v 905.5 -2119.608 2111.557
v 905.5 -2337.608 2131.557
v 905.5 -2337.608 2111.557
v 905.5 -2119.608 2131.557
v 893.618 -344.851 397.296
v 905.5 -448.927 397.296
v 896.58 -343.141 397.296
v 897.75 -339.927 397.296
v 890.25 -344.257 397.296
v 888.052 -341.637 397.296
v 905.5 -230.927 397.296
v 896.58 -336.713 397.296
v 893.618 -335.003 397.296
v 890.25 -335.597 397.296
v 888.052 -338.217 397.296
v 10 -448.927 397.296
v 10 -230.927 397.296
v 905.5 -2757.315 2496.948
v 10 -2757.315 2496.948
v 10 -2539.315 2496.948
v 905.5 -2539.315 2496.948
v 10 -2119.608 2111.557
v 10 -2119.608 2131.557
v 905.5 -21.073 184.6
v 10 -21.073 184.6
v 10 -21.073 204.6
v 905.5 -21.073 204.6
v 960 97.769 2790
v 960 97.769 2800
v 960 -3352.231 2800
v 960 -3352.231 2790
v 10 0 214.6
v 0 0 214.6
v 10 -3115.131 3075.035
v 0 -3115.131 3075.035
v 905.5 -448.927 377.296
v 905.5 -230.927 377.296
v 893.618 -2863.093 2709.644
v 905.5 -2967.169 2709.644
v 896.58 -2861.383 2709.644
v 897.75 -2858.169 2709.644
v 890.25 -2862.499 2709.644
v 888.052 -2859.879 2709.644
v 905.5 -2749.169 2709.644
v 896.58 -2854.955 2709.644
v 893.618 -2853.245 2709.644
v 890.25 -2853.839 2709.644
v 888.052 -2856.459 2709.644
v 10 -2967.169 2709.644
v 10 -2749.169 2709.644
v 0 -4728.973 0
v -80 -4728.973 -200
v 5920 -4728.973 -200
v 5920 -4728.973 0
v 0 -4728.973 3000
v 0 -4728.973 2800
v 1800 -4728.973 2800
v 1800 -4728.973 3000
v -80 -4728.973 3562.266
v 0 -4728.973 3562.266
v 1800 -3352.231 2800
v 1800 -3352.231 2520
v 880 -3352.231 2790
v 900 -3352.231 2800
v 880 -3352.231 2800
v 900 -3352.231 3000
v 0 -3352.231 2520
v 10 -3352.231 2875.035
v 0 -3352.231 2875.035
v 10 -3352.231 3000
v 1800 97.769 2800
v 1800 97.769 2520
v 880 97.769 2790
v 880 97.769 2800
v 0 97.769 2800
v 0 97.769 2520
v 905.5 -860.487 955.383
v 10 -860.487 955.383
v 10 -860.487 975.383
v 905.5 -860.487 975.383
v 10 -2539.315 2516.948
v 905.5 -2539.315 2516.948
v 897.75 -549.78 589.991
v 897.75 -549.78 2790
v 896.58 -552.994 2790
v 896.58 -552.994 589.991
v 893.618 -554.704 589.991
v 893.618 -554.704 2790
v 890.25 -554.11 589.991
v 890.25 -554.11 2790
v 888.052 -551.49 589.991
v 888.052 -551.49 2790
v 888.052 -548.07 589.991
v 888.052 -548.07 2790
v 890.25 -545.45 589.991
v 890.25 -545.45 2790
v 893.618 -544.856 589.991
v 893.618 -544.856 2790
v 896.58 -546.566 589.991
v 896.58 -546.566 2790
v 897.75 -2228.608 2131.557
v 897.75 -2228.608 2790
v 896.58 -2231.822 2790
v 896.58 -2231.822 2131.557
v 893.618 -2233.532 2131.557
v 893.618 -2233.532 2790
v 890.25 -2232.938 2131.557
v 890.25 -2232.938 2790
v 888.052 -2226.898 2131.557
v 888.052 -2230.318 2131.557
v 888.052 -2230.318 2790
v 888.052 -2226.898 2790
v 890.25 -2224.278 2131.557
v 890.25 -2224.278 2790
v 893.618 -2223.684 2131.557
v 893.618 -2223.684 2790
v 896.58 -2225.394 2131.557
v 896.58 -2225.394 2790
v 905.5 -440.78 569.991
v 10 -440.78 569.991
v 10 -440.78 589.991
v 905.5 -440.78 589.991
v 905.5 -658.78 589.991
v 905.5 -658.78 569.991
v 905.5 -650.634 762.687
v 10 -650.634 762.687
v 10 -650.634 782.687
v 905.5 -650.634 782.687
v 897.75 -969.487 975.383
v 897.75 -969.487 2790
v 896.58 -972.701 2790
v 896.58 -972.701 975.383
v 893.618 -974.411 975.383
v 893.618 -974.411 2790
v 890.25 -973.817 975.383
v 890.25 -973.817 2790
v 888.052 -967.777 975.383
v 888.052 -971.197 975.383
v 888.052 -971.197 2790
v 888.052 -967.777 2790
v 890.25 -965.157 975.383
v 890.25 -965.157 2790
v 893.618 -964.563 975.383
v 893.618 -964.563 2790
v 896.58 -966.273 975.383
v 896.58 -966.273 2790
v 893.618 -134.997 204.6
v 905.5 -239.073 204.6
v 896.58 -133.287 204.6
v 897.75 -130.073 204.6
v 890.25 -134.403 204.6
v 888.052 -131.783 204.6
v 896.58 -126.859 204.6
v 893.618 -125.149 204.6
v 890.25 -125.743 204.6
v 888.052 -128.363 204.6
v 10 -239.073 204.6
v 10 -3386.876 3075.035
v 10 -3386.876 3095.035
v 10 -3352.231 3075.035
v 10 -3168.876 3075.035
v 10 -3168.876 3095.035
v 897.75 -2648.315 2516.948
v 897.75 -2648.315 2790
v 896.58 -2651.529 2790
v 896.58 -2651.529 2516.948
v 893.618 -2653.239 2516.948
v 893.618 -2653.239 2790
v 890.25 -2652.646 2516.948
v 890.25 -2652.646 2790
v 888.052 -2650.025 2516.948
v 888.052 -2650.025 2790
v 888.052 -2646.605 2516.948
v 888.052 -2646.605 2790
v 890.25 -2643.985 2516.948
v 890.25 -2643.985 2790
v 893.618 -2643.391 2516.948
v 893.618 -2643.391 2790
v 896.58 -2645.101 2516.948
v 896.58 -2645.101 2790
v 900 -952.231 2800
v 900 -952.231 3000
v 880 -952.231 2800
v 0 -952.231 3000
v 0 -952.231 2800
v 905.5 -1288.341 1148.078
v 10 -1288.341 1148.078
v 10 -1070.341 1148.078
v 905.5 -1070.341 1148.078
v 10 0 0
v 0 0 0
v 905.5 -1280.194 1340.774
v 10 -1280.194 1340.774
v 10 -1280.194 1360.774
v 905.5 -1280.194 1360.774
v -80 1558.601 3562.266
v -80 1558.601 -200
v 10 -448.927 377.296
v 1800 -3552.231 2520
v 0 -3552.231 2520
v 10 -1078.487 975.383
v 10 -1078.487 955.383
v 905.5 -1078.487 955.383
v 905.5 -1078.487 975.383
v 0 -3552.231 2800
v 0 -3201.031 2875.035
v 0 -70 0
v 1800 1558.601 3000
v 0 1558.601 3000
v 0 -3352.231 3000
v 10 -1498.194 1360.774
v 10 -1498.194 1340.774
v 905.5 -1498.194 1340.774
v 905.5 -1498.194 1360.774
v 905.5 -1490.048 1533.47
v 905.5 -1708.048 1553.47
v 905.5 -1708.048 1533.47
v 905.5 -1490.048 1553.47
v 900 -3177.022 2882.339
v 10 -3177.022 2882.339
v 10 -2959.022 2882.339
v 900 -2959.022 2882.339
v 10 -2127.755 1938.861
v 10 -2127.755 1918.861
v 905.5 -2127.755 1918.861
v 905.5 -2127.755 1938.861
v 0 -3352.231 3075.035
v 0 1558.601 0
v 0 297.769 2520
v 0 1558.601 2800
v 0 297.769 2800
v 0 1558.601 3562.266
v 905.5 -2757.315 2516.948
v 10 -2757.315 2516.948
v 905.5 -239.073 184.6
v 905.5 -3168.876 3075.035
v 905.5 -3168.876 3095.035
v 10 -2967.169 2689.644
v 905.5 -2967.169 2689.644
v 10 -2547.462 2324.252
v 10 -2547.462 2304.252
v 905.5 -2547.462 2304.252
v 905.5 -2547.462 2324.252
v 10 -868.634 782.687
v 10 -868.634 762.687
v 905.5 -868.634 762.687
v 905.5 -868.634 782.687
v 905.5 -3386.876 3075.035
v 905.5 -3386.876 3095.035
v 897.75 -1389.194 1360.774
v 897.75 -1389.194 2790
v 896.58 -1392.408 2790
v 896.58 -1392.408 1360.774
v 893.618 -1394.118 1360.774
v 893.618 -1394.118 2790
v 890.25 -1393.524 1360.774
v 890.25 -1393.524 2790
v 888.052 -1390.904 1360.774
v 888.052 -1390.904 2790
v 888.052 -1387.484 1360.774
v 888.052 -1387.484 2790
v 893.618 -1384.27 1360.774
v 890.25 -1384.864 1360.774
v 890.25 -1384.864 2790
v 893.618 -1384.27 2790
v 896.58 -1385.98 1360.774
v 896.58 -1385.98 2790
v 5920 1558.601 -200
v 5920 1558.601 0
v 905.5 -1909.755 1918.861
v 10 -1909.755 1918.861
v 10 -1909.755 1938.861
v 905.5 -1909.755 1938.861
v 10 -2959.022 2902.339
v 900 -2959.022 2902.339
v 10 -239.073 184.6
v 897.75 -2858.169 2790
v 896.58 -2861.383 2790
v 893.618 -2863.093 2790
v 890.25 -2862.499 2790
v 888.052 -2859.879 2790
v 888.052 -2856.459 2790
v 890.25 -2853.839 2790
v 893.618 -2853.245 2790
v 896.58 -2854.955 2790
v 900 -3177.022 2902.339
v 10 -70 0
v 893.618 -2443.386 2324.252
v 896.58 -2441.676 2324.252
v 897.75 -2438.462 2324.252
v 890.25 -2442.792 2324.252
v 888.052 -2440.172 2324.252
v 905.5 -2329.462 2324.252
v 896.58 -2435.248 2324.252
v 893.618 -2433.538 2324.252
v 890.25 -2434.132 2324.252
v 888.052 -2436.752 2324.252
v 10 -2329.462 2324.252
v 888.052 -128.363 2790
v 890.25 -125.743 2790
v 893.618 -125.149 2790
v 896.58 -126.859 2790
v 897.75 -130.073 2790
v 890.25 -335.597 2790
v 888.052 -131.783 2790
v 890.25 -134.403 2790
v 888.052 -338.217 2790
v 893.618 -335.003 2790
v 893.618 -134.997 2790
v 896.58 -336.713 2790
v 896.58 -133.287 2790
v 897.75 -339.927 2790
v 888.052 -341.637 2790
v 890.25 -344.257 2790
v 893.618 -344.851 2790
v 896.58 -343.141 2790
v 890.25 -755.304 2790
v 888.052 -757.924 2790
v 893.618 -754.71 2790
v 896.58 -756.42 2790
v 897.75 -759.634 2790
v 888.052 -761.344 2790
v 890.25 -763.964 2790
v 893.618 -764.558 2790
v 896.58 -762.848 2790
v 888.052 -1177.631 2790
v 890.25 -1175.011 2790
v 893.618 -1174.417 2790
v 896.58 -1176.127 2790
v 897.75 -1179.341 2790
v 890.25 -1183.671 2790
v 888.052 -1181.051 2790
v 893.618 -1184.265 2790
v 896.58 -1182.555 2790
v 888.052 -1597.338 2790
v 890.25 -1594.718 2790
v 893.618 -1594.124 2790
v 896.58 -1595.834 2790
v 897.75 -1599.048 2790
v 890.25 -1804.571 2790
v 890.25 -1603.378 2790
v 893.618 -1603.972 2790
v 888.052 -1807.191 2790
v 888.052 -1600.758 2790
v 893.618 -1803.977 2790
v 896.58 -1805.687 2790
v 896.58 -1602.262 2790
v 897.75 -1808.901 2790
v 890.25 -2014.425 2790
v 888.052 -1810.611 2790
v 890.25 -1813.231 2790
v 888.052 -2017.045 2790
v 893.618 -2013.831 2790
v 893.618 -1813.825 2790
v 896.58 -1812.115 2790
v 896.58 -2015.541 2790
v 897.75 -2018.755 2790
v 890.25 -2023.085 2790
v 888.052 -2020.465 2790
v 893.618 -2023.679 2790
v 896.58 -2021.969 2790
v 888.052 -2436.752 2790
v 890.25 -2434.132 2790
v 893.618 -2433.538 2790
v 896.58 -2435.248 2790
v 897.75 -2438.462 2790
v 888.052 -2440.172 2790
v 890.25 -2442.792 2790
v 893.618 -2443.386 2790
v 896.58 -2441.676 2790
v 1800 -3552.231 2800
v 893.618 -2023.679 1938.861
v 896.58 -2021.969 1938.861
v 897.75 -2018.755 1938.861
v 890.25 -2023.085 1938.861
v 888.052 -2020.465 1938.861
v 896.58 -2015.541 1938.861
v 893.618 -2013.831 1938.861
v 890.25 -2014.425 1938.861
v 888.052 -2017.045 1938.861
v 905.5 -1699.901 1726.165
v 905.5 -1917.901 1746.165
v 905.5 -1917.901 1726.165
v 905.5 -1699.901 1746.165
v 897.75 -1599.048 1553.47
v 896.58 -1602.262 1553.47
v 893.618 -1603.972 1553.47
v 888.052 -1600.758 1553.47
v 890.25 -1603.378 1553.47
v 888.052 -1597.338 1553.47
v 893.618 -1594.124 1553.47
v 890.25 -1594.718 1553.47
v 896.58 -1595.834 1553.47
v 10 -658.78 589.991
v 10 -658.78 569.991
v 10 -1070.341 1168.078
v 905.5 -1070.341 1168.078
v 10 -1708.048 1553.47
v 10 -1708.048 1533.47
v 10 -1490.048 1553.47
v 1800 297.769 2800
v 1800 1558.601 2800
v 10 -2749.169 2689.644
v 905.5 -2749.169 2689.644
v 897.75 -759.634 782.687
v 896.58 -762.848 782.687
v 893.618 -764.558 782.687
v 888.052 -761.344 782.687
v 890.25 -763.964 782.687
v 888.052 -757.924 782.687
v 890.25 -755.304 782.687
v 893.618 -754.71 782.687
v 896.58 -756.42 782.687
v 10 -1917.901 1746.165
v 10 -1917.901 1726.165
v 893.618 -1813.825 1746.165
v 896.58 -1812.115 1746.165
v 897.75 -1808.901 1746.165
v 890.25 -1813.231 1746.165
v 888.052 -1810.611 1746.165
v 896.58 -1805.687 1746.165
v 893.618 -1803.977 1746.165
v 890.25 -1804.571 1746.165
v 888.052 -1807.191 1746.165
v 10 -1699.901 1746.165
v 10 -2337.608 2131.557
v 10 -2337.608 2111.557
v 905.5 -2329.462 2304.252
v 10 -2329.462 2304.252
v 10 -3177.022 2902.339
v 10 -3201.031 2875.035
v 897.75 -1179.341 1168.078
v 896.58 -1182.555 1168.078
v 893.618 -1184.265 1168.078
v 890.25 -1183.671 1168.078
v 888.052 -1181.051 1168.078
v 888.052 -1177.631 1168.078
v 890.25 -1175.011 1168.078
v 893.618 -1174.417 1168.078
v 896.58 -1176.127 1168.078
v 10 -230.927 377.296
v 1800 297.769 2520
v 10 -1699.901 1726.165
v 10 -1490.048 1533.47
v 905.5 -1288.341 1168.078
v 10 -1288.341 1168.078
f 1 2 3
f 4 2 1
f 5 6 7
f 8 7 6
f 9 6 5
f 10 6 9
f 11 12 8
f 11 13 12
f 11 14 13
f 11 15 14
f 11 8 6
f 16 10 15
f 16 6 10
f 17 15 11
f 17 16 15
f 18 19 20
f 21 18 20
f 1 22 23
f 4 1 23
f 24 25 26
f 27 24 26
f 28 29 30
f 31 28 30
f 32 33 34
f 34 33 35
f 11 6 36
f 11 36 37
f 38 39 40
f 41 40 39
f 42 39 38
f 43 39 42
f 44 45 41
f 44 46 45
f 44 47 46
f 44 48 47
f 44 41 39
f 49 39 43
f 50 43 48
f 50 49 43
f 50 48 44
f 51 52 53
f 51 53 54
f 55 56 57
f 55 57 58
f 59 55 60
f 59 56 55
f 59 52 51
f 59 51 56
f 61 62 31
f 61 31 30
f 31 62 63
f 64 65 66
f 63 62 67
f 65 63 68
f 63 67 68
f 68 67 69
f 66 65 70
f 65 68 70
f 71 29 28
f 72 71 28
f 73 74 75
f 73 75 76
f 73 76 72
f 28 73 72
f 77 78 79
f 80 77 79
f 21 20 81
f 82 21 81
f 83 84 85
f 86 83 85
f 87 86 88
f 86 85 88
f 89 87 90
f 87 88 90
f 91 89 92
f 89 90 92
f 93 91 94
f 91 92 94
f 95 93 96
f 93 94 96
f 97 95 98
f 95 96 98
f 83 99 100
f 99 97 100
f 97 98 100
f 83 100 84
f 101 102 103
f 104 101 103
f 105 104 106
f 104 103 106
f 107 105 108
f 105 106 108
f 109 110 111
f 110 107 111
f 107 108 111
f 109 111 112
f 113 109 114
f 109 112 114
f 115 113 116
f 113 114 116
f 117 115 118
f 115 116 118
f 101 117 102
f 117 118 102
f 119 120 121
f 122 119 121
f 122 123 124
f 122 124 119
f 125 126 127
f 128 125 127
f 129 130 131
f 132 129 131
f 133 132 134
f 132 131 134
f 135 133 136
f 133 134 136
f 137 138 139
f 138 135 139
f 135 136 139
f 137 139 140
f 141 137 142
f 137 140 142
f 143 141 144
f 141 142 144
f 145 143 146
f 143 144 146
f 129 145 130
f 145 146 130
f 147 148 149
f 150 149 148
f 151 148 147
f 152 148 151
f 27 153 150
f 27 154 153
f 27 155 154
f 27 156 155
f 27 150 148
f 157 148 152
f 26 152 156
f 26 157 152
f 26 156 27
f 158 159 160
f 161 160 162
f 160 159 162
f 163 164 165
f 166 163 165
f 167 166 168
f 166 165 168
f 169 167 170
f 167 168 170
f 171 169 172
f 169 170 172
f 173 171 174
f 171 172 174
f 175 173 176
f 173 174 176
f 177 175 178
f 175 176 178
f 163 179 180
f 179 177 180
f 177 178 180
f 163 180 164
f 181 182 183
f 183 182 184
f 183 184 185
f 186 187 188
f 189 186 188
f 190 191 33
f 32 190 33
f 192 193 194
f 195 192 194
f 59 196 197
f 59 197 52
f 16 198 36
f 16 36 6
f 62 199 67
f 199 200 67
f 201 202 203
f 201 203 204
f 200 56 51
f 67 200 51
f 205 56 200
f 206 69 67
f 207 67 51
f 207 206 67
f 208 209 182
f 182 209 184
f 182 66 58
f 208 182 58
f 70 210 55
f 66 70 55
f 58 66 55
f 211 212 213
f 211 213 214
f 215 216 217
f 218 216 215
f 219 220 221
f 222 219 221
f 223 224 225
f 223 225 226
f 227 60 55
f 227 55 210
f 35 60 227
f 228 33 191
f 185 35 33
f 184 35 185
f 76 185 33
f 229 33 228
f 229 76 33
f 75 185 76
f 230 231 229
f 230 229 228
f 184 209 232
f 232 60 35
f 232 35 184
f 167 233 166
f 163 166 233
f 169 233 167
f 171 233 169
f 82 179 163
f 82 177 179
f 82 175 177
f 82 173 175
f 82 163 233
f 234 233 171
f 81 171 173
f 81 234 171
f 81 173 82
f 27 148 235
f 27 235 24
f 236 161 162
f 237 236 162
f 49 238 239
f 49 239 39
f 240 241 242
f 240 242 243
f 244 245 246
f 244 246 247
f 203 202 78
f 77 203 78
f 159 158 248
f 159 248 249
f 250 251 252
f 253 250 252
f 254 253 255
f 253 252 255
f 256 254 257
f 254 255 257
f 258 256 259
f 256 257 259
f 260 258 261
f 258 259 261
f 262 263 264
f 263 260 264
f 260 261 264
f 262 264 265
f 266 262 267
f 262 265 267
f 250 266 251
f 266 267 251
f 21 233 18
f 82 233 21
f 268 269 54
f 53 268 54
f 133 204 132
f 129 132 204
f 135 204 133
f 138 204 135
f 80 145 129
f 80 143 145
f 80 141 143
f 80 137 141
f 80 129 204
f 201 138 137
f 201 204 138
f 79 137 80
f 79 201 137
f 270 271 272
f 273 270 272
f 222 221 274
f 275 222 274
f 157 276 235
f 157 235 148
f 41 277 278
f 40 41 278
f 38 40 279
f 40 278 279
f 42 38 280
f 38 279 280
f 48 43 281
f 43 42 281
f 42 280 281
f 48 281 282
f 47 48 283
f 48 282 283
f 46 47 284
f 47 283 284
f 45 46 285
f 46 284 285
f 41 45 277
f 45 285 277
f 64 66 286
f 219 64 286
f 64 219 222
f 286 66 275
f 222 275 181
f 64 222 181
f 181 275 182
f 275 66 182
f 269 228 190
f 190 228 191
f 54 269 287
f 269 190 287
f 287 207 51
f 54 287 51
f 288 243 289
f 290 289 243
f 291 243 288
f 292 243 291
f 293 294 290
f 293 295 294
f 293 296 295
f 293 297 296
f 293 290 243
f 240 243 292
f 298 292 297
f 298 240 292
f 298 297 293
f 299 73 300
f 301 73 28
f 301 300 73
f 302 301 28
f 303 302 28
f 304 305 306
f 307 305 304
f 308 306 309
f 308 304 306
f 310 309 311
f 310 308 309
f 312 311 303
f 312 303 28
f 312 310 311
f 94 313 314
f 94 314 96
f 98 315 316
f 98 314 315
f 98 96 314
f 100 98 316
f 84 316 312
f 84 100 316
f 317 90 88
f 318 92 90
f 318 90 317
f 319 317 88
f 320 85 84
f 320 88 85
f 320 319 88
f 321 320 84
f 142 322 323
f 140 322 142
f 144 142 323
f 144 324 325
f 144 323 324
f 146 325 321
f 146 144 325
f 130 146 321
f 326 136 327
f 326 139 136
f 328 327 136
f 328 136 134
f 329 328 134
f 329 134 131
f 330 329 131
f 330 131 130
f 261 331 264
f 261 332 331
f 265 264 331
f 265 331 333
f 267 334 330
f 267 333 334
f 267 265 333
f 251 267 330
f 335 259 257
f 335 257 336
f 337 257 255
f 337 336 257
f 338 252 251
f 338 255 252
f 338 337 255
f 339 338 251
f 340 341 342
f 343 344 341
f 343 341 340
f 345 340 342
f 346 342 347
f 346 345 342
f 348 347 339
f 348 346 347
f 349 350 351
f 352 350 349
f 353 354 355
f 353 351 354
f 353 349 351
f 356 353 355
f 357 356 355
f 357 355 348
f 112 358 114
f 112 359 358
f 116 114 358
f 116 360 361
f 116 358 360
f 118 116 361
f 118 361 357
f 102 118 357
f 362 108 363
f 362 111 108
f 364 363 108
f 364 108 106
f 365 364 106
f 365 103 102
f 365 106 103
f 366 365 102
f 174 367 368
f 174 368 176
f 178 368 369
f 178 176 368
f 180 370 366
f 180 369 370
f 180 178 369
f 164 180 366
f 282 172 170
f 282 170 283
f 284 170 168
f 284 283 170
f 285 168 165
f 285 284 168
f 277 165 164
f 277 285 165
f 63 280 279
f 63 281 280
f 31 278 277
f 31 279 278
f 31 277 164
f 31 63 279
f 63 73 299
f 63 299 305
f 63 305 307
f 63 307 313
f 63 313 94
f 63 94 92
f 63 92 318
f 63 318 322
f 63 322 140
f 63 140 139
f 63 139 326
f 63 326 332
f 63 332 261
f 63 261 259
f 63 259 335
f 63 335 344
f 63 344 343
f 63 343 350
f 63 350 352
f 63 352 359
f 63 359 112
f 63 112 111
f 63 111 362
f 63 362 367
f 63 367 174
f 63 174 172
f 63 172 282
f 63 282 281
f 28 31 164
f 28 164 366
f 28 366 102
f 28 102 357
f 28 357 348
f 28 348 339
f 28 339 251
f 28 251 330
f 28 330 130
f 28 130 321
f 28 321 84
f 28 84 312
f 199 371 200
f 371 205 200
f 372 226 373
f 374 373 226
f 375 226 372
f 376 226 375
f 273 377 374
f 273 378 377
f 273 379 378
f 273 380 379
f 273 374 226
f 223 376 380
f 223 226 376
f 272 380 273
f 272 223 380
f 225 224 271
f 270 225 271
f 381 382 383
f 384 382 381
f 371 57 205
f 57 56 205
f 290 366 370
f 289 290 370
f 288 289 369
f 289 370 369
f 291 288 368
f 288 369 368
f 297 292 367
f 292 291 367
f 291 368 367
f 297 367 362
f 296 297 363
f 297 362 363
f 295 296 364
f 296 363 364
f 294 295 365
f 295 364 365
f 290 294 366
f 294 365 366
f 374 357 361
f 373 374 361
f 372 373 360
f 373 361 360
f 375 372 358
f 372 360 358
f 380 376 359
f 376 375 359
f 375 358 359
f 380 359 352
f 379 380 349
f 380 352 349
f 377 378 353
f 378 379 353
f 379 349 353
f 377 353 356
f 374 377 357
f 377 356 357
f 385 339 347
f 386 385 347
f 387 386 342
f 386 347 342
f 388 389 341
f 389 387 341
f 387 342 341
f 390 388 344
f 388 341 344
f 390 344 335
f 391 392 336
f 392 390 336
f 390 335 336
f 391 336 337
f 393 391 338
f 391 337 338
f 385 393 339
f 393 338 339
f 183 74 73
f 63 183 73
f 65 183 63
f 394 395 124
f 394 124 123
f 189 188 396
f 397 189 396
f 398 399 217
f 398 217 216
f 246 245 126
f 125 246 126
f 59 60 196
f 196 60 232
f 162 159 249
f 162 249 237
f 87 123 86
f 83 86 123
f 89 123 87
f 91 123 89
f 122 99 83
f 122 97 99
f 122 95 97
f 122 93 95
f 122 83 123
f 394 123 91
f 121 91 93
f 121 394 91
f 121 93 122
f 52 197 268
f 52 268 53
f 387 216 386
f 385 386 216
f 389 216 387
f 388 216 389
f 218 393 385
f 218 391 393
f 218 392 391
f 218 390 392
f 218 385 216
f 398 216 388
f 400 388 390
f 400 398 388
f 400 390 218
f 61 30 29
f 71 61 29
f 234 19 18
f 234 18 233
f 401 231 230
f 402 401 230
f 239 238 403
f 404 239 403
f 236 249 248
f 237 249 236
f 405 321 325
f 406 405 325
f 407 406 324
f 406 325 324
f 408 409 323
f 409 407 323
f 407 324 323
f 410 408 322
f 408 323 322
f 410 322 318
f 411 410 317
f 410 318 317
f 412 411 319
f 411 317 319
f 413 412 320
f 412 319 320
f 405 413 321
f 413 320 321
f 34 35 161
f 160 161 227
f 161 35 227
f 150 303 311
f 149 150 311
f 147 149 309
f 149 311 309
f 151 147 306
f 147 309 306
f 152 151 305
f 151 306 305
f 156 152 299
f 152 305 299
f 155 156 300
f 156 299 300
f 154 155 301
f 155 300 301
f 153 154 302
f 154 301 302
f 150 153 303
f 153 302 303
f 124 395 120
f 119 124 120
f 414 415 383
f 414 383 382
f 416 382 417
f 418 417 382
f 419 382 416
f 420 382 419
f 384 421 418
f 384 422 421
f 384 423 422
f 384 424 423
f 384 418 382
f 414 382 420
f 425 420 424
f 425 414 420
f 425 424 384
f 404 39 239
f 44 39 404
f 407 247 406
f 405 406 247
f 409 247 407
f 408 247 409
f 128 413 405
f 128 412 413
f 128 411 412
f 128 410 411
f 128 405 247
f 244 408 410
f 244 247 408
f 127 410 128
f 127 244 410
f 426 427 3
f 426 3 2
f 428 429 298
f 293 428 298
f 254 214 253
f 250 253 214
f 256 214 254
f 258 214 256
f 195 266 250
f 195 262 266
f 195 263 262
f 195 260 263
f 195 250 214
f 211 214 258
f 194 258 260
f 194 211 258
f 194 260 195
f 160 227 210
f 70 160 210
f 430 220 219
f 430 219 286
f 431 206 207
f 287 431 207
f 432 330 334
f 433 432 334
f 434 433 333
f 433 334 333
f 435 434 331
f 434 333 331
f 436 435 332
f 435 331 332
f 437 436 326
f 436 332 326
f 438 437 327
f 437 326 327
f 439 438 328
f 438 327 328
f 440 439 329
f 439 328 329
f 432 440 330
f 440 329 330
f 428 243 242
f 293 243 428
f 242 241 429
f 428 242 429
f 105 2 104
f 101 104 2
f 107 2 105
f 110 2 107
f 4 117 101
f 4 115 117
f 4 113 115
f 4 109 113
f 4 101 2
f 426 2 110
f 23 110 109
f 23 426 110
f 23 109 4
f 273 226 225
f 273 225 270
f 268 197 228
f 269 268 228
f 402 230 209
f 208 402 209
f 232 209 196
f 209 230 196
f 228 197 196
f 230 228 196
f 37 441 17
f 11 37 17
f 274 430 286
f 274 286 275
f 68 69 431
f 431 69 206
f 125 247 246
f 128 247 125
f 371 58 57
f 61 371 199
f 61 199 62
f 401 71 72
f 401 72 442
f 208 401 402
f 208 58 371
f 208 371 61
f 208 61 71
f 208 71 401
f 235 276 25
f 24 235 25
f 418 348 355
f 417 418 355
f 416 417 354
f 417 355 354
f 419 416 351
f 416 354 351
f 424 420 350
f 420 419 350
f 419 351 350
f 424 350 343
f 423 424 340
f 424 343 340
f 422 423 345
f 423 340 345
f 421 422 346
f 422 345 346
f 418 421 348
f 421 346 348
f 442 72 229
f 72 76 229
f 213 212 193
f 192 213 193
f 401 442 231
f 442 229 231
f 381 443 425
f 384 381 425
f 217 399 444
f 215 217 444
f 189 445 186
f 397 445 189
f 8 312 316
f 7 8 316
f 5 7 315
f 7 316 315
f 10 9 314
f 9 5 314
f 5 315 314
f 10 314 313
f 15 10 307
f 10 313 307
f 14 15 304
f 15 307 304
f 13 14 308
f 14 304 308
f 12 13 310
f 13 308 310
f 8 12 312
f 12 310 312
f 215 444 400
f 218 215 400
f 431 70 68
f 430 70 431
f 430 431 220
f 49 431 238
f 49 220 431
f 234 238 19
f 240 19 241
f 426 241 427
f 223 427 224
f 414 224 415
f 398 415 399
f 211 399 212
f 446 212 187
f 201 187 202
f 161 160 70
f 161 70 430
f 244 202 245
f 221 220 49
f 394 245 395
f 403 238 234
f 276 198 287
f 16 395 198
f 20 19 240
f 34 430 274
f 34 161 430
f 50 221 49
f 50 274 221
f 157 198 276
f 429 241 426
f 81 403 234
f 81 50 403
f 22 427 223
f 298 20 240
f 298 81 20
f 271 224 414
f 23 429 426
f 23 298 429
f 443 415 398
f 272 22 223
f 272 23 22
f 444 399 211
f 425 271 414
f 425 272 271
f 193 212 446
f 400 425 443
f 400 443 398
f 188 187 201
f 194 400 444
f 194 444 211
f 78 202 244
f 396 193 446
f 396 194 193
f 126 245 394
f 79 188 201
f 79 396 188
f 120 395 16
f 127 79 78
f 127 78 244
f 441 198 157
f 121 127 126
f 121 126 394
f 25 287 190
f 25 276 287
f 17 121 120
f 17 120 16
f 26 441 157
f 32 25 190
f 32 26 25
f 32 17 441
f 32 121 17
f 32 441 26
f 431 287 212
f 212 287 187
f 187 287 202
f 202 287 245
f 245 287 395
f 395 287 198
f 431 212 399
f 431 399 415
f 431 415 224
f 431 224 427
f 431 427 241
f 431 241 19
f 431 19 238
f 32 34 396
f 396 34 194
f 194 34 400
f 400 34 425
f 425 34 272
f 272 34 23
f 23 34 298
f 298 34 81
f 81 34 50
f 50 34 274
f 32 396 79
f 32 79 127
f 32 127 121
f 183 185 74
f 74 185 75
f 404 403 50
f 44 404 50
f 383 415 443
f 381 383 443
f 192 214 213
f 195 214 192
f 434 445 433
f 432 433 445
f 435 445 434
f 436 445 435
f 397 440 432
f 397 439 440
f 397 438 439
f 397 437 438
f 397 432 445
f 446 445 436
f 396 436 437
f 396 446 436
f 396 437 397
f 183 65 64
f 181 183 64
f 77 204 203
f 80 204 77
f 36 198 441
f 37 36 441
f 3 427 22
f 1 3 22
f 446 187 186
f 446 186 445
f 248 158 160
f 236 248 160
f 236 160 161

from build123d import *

# Parameters (mm, degrees)
F1_DEPTH  = 10
F2_W      = 6287.5739336014
F2_H      = 3562.2663497925
F3_DEPTH  = 80
F5_W      = 218
F5_H      = 20
F6_DEPTH  = 895.5
F8_DEPTH  = 900
F10_DEPTH = 900
F11_W     = 80
F11_H     = 3450
F12_DEPTH = 10
F13_R     = 5
F15_W     = 6287.5739336014
F15_H     = 200
F16_DEPTH = 6000


with BuildPart() as f1:
    # F0 (on Right) → F1 (new body)
    with BuildSketch(Plane.YZ):
        Polygon((-3352.2313924666, 2875.0351150951), (-3201.0313924666, 2875.0351150951), (-70, 0), (0, 0), (0, 214.6), (-3115.1313924666, 3075.0351150951), (-3352.2313924666, 3075.0351150951), align=None)
    extrude(amount=F1_DEPTH)

    # F2 (on Right) → F3 (join)
    with BuildSketch(Plane.YZ):
        with Locations((-1585.1864218712, 1781.1331748962)):
            Rectangle(F2_W, F2_H)
    extrude(amount=-F3_DEPTH)

    # F5 (on face) → F6 (join)
    with BuildSketch(Plane.YZ.offset(10)):
        with Locations((-130.0732876712, 194.6)):
            Rectangle(F5_W, F5_H)
        with Locations((-339.9267960275, 387.2956743397)):
            Rectangle(F5_W, F5_H)
        with Locations((-549.7803043837, 579.9913486793)):
            Rectangle(F5_W, F5_H)
        with Locations((-759.6338127399, 772.687023019)):
            Rectangle(F5_W, F5_H)
        with Locations((-969.4873210961, 965.3826973587)):
            Rectangle(F5_W, F5_H)
        with Locations((-1179.3408294523, 1158.0783716984)):
            Rectangle(F5_W, F5_H)
        with Locations((-1389.1943378086, 1350.774046038)):
            Rectangle(F5_W, F5_H)
        with Locations((-1599.0478461648, 1543.4697203777)):
            Rectangle(F5_W, F5_H)
        with Locations((-1808.901354521, 1736.1653947174)):
            Rectangle(F5_W, F5_H)
        with Locations((-2018.7548628772, 1928.8610690571)):
            Rectangle(F5_W, F5_H)
        with Locations((-2228.6083712334, 2121.5567433967)):
            Rectangle(F5_W, F5_H)
        with Locations((-2438.4618795897, 2314.2524177364)):
            Rectangle(F5_W, F5_H)
        with Locations((-2648.3153879459, 2506.9480920761)):
            Rectangle(F5_W, F5_H)
        with Locations((-2858.1688963021, 2699.6437664158)):
            Rectangle(F5_W, F5_H)
        with Locations((-3068.0224046583, 2892.3394407554)):
            Rectangle(F5_W, F5_H)
        with Locations((-3277.8759130145, 3085.0351150951)):
            Rectangle(F5_W, F5_H)
    extrude(amount=F6_DEPTH)

    # F7 (on face) → F8 (join)
    with BuildSketch(Plane.YZ):
        Polygon((-3352.2313924666, 3000), (-4728.9733886719, 3000), (-4728.9733886719, 2800), (-3552.2313924666, 2800), (-3552.2313924666, 2520), (-3352.2313924666, 2520), align=None)
        Polygon((1558.6005449295, 3000), (-952.2313924666, 3000), (-952.2313924666, 2800), (97.7686075334, 2800), (97.7686075334, 2520), (297.7686075334, 2520), (297.7686075334, 2800), (1558.6005449295, 2800), align=None)
    extrude(amount=F8_DEPTH)

    # F9 (on face) → F10 (join)
    with BuildSketch(Plane.YZ.offset(900)):
        Polygon((1558.6005449295, 3000), (-4728.9733886719, 3000), (-4728.9733886719, 2800), (-3552.2313924666, 2800), (-3552.2313924666, 2520), (-3352.2313924666, 2520), (-3352.2313924666, 2800), (97.7686075334, 2800), (97.7686075334, 2520), (297.7686075334, 2520), (297.7686075334, 2800), (1558.6005449295, 2800), align=None)
    extrude(amount=F10_DEPTH)

    # F11 (on face) → F12 (join)
    with BuildSketch(Plane(origin=(0, 0, 2800), x_dir=(1, 0, 0), z_dir=(0, 0, -1))):
        with Locations((920, 1627.2313924666)):
            Rectangle(F11_W, F11_H)
    extrude(amount=F12_DEPTH)

    # F13 (on face) → F14 (join, up to the next surface of F1)
    with BuildSketch(Plane(origin=(0, 0, 2790), x_dir=(1, 0, 0), z_dir=(0, 0, -1))):
        with Locations((892.75, 2858.1688963021)):
            Circle(F13_R)
        with Locations((892.75, 2648.3153879459)):
            Circle(F13_R)
        with Locations((892.75, 2438.4618795897)):
            Circle(F13_R)
        with Locations((892.75, 2228.6083712334)):
            Circle(F13_R)
        with Locations((892.75, 2018.7548628772)):
            Circle(F13_R)
        with Locations((892.75, 1808.901354521)):
            Circle(F13_R)
        with Locations((892.75, 1599.0478461648)):
            Circle(F13_R)
        with Locations((892.75, 1389.1943378086)):
            Circle(F13_R)
        with Locations((892.75, 1179.3408294523)):
            Circle(F13_R)
        with Locations((892.75, 969.4873210961)):
            Circle(F13_R)
        with Locations((892.75, 759.6338127399)):
            Circle(F13_R)
        with Locations((892.75, 549.7803043837)):
            Circle(F13_R)
        with Locations((892.75, 339.9267960275)):
            Circle(F13_R)
        with Locations((892.75, 130.0732876712)):
            Circle(F13_R)
    extrude(until=Until.NEXT)

    # F15 (on face) → F16 (join)
    with BuildSketch(Plane(origin=(-80, 0, 0), x_dir=(0, -1, 0), z_dir=(-1, 0, 0))):
        with Locations((1585.1864218712, -100)):
            Rectangle(F15_W, F15_H)
    extrude(amount=-F16_DEPTH)


solid = f1.part
